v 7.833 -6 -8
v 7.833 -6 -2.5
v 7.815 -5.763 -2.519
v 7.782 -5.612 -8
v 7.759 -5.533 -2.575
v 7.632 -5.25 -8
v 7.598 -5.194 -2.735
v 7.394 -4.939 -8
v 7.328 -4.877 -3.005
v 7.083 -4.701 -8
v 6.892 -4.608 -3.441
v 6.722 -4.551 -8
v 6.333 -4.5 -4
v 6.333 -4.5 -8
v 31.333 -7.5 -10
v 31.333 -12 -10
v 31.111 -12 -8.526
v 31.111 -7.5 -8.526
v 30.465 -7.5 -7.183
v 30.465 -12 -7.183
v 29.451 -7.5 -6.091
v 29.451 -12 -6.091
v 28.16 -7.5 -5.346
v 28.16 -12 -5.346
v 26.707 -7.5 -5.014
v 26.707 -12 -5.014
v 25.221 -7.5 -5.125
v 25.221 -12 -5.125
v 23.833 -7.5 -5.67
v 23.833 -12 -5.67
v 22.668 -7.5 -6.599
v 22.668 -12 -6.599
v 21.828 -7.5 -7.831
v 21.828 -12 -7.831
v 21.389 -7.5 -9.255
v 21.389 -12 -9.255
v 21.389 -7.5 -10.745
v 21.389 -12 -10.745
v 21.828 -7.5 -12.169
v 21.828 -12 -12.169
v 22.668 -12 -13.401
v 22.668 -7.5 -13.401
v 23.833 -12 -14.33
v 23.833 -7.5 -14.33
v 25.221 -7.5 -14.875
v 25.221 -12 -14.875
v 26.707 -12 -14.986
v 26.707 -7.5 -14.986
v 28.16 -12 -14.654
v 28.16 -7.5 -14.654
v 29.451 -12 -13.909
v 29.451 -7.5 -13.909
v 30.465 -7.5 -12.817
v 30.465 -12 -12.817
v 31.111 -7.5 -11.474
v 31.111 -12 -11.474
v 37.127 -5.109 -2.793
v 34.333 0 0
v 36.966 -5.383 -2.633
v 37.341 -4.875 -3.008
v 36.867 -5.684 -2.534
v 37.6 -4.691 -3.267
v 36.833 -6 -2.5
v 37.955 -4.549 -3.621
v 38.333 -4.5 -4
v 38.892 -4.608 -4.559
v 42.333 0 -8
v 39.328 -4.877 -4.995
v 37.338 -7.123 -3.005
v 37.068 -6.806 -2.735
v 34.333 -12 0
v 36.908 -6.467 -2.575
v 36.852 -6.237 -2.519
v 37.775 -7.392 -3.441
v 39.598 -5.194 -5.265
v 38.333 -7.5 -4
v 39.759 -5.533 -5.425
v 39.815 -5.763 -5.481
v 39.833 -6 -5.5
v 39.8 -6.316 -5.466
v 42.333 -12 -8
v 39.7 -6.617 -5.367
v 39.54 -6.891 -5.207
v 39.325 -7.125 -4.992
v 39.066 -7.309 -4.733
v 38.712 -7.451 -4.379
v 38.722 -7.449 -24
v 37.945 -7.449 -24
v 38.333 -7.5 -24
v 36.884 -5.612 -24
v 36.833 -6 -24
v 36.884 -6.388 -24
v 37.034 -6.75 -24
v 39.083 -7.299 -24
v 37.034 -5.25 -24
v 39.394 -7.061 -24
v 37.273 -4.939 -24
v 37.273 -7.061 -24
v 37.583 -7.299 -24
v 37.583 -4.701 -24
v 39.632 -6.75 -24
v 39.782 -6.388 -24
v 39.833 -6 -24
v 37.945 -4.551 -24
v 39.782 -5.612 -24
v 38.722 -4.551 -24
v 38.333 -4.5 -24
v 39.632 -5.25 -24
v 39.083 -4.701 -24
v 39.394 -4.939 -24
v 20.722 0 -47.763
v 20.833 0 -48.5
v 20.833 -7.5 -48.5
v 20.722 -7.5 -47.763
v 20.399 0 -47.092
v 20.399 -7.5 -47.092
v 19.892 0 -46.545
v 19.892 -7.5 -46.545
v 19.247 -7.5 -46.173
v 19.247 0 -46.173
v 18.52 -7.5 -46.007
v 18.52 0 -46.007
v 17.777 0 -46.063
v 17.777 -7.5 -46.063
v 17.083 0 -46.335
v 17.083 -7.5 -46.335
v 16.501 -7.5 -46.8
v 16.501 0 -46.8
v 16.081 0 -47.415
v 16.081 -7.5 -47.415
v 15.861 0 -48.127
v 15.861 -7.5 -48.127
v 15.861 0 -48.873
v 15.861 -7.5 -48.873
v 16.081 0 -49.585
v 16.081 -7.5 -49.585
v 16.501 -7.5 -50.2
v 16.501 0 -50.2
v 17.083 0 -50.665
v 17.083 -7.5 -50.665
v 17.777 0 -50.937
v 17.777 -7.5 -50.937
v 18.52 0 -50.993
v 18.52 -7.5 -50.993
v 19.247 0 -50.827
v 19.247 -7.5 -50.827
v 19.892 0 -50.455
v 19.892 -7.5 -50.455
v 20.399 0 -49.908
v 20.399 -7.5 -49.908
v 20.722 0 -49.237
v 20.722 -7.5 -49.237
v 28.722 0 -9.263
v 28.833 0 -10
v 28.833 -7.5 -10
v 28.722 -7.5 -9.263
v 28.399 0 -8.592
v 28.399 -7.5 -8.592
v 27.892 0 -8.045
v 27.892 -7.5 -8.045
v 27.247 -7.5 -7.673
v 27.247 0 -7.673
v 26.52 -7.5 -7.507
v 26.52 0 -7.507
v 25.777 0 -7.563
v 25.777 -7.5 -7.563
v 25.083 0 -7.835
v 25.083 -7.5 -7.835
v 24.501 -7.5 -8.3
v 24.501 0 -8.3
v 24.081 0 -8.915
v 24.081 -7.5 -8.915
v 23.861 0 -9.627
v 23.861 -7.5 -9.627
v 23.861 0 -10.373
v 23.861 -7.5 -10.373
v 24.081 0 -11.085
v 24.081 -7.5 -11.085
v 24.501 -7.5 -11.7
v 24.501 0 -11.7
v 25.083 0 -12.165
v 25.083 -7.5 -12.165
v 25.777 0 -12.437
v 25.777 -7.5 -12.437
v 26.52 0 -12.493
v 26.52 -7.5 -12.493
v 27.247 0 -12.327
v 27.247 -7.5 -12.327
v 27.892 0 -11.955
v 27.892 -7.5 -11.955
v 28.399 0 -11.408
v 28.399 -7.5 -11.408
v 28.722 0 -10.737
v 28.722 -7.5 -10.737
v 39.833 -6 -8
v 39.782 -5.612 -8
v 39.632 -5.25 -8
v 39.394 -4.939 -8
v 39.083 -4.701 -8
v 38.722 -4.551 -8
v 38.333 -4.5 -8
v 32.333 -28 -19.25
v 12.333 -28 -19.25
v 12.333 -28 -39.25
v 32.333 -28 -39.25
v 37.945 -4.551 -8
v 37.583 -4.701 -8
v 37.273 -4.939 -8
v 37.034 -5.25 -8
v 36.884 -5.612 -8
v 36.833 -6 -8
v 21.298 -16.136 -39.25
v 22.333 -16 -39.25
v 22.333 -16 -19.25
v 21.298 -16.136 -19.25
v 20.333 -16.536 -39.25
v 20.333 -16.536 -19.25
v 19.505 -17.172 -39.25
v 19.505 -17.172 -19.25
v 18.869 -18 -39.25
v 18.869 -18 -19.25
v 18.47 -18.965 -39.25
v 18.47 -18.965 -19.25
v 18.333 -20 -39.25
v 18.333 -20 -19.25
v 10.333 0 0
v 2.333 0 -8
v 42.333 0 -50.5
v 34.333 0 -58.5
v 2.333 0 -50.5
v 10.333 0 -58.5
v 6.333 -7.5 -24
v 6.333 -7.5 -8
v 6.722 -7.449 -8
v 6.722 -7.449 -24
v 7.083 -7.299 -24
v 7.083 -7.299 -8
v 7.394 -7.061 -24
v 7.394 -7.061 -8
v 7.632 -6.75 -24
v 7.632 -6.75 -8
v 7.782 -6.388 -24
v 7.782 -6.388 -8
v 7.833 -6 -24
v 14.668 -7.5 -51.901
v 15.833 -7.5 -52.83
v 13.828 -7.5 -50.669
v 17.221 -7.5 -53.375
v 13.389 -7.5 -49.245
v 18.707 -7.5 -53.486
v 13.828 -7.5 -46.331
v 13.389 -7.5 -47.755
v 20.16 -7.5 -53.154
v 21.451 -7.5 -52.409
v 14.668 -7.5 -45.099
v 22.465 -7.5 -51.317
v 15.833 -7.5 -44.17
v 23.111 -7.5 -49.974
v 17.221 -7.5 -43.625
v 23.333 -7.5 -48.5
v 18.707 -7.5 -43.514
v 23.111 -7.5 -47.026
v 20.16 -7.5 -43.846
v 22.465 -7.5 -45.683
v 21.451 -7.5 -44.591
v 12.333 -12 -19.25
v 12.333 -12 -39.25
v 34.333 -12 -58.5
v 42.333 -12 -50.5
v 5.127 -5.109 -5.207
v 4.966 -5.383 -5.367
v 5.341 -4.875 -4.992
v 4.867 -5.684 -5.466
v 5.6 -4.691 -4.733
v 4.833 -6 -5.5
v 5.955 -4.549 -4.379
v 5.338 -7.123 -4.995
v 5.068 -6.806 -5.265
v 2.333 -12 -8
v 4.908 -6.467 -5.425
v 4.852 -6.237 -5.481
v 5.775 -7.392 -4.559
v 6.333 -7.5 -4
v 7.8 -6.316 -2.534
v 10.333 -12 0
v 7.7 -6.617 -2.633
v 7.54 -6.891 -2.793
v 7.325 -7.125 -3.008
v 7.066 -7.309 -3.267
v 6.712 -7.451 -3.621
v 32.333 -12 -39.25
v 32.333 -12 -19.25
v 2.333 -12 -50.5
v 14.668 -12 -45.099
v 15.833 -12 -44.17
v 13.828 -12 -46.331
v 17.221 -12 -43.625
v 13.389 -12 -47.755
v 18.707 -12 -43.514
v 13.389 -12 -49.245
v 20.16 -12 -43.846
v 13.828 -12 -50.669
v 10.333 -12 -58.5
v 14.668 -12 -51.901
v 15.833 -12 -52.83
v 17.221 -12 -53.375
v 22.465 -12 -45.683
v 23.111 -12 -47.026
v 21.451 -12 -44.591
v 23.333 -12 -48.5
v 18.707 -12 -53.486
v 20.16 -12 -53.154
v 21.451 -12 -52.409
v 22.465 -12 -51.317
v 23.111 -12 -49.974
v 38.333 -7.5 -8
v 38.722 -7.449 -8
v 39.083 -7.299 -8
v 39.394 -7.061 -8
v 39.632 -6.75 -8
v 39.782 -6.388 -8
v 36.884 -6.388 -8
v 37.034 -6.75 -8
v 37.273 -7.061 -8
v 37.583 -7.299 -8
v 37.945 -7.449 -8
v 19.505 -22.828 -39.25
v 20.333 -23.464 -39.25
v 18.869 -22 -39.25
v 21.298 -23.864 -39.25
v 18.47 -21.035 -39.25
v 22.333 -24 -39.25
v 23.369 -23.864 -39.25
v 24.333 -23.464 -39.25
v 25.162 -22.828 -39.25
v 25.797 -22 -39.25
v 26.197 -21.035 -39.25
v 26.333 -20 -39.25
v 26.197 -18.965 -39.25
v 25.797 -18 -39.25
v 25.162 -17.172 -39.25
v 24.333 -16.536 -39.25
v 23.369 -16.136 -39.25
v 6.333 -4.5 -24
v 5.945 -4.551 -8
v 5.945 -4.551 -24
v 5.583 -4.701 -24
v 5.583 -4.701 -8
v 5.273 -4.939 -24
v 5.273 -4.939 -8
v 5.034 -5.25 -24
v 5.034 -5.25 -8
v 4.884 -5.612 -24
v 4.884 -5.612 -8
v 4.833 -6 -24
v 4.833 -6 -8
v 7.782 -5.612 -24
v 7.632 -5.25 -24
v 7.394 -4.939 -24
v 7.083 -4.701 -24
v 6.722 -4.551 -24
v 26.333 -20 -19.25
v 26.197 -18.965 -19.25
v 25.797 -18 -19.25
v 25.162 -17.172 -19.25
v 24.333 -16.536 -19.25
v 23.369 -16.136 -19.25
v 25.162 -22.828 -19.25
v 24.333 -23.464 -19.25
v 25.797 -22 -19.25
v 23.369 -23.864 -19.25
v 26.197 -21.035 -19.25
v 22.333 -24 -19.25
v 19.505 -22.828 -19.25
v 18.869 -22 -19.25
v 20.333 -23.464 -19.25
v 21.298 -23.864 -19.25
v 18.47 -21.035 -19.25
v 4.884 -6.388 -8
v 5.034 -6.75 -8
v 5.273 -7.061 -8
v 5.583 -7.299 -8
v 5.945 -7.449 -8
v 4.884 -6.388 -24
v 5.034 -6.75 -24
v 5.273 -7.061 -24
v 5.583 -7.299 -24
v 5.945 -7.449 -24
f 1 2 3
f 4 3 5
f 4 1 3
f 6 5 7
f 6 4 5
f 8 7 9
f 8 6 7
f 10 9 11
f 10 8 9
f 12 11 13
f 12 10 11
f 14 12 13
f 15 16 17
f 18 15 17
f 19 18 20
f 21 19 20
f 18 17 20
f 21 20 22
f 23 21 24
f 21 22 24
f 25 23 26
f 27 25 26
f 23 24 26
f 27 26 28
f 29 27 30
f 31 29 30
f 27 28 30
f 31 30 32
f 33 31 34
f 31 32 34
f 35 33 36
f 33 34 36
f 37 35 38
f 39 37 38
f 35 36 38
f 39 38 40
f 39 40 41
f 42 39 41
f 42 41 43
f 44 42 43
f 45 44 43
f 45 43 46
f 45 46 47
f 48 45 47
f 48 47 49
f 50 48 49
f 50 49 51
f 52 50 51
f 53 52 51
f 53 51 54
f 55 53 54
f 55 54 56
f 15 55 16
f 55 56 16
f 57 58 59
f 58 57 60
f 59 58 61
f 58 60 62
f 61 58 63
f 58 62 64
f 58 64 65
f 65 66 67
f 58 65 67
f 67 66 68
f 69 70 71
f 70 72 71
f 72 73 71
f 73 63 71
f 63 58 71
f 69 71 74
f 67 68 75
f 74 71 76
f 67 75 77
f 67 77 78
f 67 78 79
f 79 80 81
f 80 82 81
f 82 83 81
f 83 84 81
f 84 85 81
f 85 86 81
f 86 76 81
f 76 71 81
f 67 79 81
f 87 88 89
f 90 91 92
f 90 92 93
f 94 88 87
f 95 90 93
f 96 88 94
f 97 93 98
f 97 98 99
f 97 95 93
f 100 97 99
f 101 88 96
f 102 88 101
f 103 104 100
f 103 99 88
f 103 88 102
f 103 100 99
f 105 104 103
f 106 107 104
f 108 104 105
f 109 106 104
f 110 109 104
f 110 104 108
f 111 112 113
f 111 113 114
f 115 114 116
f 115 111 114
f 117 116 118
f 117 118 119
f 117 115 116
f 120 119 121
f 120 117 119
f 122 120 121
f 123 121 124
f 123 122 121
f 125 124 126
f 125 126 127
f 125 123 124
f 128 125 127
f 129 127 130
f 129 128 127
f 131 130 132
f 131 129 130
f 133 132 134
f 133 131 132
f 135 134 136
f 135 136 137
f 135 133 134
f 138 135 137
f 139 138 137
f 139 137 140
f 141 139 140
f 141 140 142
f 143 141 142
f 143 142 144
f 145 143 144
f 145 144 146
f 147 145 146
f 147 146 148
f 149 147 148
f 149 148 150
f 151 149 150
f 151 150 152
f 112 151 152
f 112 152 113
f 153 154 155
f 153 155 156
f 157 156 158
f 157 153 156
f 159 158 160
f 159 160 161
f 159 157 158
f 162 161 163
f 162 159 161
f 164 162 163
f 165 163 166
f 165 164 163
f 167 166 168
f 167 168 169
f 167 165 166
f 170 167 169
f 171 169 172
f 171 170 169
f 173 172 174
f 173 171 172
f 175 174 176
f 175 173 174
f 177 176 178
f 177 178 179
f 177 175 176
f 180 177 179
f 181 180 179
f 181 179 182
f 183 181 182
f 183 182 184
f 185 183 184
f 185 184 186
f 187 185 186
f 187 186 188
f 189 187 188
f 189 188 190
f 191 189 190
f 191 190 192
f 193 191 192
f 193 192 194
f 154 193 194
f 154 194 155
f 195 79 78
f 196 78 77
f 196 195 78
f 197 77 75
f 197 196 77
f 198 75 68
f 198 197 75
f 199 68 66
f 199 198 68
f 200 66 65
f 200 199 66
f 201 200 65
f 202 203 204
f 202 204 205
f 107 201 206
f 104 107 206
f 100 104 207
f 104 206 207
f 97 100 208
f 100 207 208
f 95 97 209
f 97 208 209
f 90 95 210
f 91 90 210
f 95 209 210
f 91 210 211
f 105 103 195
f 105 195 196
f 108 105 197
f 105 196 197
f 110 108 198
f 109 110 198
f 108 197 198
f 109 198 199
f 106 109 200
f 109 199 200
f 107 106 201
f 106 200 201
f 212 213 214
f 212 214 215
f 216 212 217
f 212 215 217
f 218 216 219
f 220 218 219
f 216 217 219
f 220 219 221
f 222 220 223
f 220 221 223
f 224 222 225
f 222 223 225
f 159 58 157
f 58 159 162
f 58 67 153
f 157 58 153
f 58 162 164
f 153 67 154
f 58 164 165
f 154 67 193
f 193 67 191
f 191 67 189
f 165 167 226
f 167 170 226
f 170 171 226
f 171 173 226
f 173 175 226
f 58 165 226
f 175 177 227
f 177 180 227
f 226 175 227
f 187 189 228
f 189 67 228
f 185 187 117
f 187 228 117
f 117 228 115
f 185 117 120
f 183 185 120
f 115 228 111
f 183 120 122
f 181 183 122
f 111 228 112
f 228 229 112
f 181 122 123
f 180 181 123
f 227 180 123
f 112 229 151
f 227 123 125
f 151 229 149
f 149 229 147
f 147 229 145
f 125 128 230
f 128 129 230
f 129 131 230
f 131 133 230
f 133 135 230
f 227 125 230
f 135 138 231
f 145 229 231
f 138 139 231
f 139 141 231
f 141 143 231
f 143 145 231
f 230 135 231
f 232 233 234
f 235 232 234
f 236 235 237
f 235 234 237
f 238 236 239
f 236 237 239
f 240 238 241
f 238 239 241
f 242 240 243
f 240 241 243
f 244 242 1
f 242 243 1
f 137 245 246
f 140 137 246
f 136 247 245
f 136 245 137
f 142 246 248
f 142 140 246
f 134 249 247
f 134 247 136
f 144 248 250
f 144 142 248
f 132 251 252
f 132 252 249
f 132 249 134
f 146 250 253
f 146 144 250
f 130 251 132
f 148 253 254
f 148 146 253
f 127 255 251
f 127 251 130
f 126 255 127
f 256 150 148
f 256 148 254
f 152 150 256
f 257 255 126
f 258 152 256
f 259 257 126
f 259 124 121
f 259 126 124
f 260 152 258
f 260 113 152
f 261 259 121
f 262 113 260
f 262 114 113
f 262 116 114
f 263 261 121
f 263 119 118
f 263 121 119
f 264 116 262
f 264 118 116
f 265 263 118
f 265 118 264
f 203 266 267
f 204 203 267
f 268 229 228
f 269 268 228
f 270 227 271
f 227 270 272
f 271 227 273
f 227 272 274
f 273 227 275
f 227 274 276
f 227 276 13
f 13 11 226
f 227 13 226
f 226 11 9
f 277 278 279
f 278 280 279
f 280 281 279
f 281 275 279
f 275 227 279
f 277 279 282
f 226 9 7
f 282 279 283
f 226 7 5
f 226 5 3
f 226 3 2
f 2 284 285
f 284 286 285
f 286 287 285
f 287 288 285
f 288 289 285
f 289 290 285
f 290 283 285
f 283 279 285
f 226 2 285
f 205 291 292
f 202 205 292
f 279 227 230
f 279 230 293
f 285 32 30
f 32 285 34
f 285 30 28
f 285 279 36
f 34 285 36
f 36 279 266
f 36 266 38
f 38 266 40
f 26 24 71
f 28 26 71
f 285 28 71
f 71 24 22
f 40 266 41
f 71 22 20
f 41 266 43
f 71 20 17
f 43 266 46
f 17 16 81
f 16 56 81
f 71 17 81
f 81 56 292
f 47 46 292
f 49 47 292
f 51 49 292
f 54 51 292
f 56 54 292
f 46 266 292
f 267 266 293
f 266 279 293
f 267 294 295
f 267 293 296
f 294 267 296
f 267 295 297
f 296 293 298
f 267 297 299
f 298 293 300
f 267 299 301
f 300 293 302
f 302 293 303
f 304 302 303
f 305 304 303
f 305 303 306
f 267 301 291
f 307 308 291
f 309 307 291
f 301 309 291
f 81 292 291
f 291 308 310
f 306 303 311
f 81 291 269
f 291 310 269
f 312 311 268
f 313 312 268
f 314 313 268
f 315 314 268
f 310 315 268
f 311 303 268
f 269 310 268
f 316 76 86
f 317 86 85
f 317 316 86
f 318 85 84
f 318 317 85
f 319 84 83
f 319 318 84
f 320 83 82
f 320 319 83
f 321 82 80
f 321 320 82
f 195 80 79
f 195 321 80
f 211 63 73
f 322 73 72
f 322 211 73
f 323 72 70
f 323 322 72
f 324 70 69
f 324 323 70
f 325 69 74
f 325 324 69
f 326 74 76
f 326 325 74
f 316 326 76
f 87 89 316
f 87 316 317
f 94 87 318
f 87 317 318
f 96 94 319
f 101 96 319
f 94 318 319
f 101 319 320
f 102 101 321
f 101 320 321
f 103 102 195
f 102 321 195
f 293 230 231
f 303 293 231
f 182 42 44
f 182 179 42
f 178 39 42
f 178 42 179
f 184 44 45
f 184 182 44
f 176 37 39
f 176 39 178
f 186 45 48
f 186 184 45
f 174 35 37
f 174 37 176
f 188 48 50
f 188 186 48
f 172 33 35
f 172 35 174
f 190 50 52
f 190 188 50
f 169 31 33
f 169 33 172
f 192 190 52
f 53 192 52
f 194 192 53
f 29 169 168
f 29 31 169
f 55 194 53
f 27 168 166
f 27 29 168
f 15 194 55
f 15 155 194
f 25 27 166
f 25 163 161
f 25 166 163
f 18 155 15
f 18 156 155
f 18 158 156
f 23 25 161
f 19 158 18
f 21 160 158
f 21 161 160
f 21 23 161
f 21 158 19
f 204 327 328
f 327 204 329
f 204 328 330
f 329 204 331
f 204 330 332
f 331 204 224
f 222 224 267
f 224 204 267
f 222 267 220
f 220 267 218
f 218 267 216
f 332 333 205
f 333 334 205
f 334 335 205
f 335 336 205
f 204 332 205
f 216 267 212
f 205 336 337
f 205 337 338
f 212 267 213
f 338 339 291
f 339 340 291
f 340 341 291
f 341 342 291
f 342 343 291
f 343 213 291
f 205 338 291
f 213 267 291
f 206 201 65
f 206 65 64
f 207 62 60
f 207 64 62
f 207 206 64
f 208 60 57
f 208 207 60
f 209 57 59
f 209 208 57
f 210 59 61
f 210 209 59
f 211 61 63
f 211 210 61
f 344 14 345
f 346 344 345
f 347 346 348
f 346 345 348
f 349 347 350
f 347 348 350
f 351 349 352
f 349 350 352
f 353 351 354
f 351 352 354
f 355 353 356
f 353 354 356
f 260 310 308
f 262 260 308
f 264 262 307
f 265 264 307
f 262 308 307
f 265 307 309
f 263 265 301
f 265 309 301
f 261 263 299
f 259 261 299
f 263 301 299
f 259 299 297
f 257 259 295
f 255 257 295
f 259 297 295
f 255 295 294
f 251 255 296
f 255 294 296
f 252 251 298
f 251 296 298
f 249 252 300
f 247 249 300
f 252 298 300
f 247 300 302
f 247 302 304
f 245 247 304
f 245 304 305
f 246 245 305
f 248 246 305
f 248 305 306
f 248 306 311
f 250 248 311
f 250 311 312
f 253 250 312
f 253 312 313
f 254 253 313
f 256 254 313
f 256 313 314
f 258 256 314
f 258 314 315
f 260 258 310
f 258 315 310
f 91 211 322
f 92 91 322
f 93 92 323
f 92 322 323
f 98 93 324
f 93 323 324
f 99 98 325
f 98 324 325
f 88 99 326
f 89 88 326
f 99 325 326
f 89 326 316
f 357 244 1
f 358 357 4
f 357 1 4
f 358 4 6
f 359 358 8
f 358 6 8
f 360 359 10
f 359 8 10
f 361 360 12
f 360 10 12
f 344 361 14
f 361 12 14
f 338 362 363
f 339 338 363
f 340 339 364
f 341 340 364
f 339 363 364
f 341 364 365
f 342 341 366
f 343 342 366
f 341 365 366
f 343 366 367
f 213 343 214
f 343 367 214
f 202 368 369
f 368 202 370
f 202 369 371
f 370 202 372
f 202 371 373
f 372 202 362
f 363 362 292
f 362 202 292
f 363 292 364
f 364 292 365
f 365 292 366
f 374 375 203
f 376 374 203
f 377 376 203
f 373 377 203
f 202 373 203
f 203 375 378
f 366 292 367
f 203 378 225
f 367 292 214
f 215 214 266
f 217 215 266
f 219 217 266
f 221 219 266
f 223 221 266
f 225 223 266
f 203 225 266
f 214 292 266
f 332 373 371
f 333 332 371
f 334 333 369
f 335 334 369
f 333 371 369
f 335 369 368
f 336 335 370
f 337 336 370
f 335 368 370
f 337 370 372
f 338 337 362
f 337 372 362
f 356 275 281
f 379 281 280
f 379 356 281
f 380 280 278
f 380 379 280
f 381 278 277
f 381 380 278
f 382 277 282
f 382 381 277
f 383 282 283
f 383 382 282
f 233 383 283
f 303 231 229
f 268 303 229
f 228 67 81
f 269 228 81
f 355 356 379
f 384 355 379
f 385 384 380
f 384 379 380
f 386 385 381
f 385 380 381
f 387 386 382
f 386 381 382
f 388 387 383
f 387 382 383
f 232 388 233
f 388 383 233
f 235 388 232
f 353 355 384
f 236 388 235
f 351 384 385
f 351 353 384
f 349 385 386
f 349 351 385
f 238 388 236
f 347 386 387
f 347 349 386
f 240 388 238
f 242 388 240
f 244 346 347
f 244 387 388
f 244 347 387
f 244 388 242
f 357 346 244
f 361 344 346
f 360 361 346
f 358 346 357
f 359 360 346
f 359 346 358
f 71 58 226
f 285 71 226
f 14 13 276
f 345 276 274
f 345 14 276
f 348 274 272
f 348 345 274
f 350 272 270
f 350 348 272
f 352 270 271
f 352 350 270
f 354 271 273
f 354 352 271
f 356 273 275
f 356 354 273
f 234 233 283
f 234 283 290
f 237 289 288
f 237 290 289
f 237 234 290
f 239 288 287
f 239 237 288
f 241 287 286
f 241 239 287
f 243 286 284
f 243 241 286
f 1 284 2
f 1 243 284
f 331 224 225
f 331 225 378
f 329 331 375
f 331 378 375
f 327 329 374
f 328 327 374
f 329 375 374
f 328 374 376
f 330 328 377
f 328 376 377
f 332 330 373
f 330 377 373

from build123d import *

# Parameters (mm, degrees)
F0_R      = 2.5
F1_DEPTH  = 12
F0_W      = 10
F0_H      = 10
F2_DEPTH  = 28
F4_DEPTH  = 25
F6_DEPTH  = 16
F8_DEPTH  = 25
F10_DEPTH = 16
F11_DEPTH = 25
F13_DEPTH = 25
F14_DEPTH = 25
F16_DEPTH = 25
F18_DEPTH = 25
F19_R     = 5
F19_R_2   = 2.5
F20_DEPTH = 4.5
F21_DEPTH = 4.5


with BuildPart() as f1:
    # F0 (on Front) → F1 (new body)
    with BuildSketch(Plane.XZ):
        Polygon((22.3333325194, 0), (10.3333325194, 0), (2.3333325194, -8), (2.3333325194, -29.25), (12.3333325194, -29.25), (12.3333325194, -19.25), (22.3333325194, -19.25), align=None)
        Polygon((34.3333325194, 0), (22.3333325194, 0), (22.3333325194, -19.25), (32.3333325194, -19.25), (32.3333325194, -29.25), (42.3333325194, -29.25), (42.3333325194, -8), align=None)
        with Locations((26.3333325194, -10)):
            Circle(F0_R, mode=Mode.SUBTRACT)
        Polygon((12.3333325194, -29.25), (2.3333325194, -29.25), (2.3333325194, -50.5), (10.3333325194, -58.5), (22.3333325194, -58.5), (22.3333325194, -39.25), (12.3333325194, -39.25), align=None)
        with Locations((18.3333325194, -48.5)):
            Circle(F0_R, mode=Mode.SUBTRACT)
        Polygon((32.3333325194, -39.25), (22.3333325194, -39.25), (22.3333325194, -58.5), (34.3333325194, -58.5), (42.3333325194, -50.5), (42.3333325194, -29.25), (32.3333325194, -29.25), align=None)
    extrude(amount=F1_DEPTH)

    # F0 (on Front) → F2 (join)
    with BuildSketch(Plane.XZ):
        with Locations((17.3333325194, -24.25)):
            Rectangle(F0_W, F0_H)
        with Locations((27.3333325194, -24.25)):
            Rectangle(F0_W, F0_H)
        with Locations((27.3333325194, -34.25)):
            Rectangle(F0_W, F0_H)
        with Locations((17.3333325194, -34.25)):
            Rectangle(F0_W, F0_H)
    extrude(amount=F2_DEPTH)

    # F3 (on face) → F4 (cut)
    with BuildSketch(Plane(origin=(0, 0, 0), x_dir=(-1, 0, 0), z_dir=(0, 1, 0))):
        Polygon((-34.3333325194, 0), (-42.3333325194, -8), (-34.3333325194, -8), align=None)
    extrude(amount=-F4_DEPTH, mode=Mode.SUBTRACT)

    # F5 (on face) → F6 (cut)
    with BuildSketch(Plane.XY.offset(-8)):
        with BuildLine():
            Line((36.8333325194, -6), (38.3333325194, -6))
            Line((38.3333325194, -6), (38.3333325194, -4.5))
            ThreePointArc((38.3333325194, -4.5), (37.2726723477, -4.9393398282), (36.8333325194, -6))
        make_face()
        with BuildLine():
            Line((38.3333325194, -7.5), (38.3333325194, -6))
            Line((38.3333325194, -6), (36.8333325194, -6))
            ThreePointArc((36.8333325194, -6), (37.2726723477, -7.0606601718), (38.3333325194, -7.5))
        make_face()
        with BuildLine():
            ThreePointArc((38.3333325194, -7.5), (39.3939926912, -7.0606601718), (39.8333325194, -6))
            Line((39.8333325194, -6), (38.3333325194, -6))
            Line((38.3333325194, -6), (38.3333325194, -7.5))
        make_face()
        with BuildLine():
            Line((38.3333325194, -6), (39.8333325194, -6))
            ThreePointArc((39.8333325194, -6), (39.3939926912, -4.9393398282), (38.3333325194, -4.5))
            Line((38.3333325194, -4.5), (38.3333325194, -6))
        make_face()
    extrude(amount=-F6_DEPTH, mode=Mode.SUBTRACT)

    # F7 (on face) → F8 (cut)
    with BuildSketch(Plane(origin=(0, 0, 0), x_dir=(-1, 0, 0), z_dir=(0, 1, 0))):
        Polygon((-10.3333325194, -8), (-6.3333325194, -8), (-6.3333325194, -4), (-10.3333325194, 0), align=None)
        Polygon((-6.3333325194, -4), (-6.3333325194, -8), (-2.3333325194, -8), align=None)
    extrude(amount=-F8_DEPTH, mode=Mode.SUBTRACT)

    # F9 (on face) → F10 (cut)
    with BuildSketch(Plane.XY.offset(-8)):
        with BuildLine():
            Line((6.3333325194, -7.5), (6.3333325194, -6))
            Line((6.3333325194, -6), (4.8333325194, -6))
            ThreePointArc((4.8333325194, -6), (5.2726723477, -7.0606601718), (6.3333325194, -7.5))
        make_face()
        with BuildLine():
            Line((4.8333325194, -6), (6.3333325194, -6))
            Line((6.3333325194, -6), (6.3333325194, -4.5))
            ThreePointArc((6.3333325194, -4.5), (5.2726723477, -4.9393398282), (4.8333325194, -6))
        make_face()
        with BuildLine():
            Line((6.3333325194, -6), (7.8333325194, -6))
            ThreePointArc((7.8333325194, -6), (7.3939926912, -4.9393398282), (6.3333325194, -4.5))
            Line((6.3333325194, -4.5), (6.3333325194, -6))
        make_face()
        with BuildLine():
            ThreePointArc((6.3333325194, -7.5), (7.3939926912, -7.0606601718), (7.8333325194, -6))
            Line((7.8333325194, -6), (6.3333325194, -6))
            Line((6.3333325194, -6), (6.3333325194, -7.5))
        make_face()
    extrude(amount=-F10_DEPTH, mode=Mode.SUBTRACT)

    # F11 (add): a face of the model
    f11_faces = [f1.faces().sort_by_distance(p)[0] for p in [
        (6.3333325194, -0.144222051, -8),
    ]]
    extrude(f11_faces, amount=F11_DEPTH)

    # F12 (on face) → F13 (cut)
    with BuildSketch(Plane.XZ.offset(12)):
        Polygon((2.3333325194, -8), (10.3333325194, 0), (10.3333325194, 17), (2.3333325194, 17), align=None)
    extrude(amount=-F13_DEPTH, mode=Mode.SUBTRACT)

    # F14 (add): a face of the model
    f14_faces = [f1.faces().sort_by_distance(p)[0] for p in [
        (38.3333325194, -0.144222051, -8),
    ]]
    extrude(f14_faces, amount=F14_DEPTH)

    # F15 (on face) → F16 (cut)
    with BuildSketch(Plane.XZ.offset(12)):
        Polygon((34.3333325194, 17), (34.3333325194, 0), (42.3333325194, -8), (42.3333325194, 17), align=None)
    extrude(amount=-F16_DEPTH, mode=Mode.SUBTRACT)

    # F17 (on face) → F18 (cut)
    with BuildSketch(Plane.XY.offset(-19.25)):
        with BuildLine():
            Line((22.3333325194, -24), (22.3333325194, -20))
            Line((22.3333325194, -20), (18.3333325194, -20))
            ThreePointArc((18.3333325194, -20), (19.5049053947, -22.8284271247), (22.3333325194, -24))
        make_face()
        with BuildLine():
            Line((18.3333325194, -20), (22.3333325194, -20))
            Line((22.3333325194, -20), (22.3333325194, -16))
            ThreePointArc((22.3333325194, -16), (19.5049053947, -17.1715728753), (18.3333325194, -20))
        make_face()
        with BuildLine():
            Line((22.3333325194, -20), (26.3333325194, -20))
            ThreePointArc((26.3333325194, -20), (25.1617596442, -17.1715728753), (22.3333325194, -16))
            Line((22.3333325194, -16), (22.3333325194, -20))
        make_face()
        with BuildLine():
            ThreePointArc((22.3333325194, -24), (25.1617596442, -22.8284271247), (26.3333325194, -20))
            Line((26.3333325194, -20), (22.3333325194, -20))
            Line((22.3333325194, -20), (22.3333325194, -24))
        make_face()
    extrude(amount=-F18_DEPTH, mode=Mode.SUBTRACT)

    # F19 (on face) → F20 (cut)
    with BuildSketch(Plane.XZ.offset(12)):
        with Locations((26.3333325194, -10)):
            Circle(F19_R)
        with Locations((26.3333325194, -10)):
            Circle(F19_R_2, mode=Mode.SUBTRACT)
    extrude(amount=-F20_DEPTH, mode=Mode.SUBTRACT)

    # F19 (on face) → F21 (cut)
    with BuildSketch(Plane.XZ.offset(12)):
        with Locations((18.3333325194, -48.5)):
            Circle(F19_R)
        with Locations((18.3333325194, -48.5)):
            Circle(F19_R_2, mode=Mode.SUBTRACT)
    extrude(amount=-F21_DEPTH, mode=Mode.SUBTRACT)


solid = f1.part
